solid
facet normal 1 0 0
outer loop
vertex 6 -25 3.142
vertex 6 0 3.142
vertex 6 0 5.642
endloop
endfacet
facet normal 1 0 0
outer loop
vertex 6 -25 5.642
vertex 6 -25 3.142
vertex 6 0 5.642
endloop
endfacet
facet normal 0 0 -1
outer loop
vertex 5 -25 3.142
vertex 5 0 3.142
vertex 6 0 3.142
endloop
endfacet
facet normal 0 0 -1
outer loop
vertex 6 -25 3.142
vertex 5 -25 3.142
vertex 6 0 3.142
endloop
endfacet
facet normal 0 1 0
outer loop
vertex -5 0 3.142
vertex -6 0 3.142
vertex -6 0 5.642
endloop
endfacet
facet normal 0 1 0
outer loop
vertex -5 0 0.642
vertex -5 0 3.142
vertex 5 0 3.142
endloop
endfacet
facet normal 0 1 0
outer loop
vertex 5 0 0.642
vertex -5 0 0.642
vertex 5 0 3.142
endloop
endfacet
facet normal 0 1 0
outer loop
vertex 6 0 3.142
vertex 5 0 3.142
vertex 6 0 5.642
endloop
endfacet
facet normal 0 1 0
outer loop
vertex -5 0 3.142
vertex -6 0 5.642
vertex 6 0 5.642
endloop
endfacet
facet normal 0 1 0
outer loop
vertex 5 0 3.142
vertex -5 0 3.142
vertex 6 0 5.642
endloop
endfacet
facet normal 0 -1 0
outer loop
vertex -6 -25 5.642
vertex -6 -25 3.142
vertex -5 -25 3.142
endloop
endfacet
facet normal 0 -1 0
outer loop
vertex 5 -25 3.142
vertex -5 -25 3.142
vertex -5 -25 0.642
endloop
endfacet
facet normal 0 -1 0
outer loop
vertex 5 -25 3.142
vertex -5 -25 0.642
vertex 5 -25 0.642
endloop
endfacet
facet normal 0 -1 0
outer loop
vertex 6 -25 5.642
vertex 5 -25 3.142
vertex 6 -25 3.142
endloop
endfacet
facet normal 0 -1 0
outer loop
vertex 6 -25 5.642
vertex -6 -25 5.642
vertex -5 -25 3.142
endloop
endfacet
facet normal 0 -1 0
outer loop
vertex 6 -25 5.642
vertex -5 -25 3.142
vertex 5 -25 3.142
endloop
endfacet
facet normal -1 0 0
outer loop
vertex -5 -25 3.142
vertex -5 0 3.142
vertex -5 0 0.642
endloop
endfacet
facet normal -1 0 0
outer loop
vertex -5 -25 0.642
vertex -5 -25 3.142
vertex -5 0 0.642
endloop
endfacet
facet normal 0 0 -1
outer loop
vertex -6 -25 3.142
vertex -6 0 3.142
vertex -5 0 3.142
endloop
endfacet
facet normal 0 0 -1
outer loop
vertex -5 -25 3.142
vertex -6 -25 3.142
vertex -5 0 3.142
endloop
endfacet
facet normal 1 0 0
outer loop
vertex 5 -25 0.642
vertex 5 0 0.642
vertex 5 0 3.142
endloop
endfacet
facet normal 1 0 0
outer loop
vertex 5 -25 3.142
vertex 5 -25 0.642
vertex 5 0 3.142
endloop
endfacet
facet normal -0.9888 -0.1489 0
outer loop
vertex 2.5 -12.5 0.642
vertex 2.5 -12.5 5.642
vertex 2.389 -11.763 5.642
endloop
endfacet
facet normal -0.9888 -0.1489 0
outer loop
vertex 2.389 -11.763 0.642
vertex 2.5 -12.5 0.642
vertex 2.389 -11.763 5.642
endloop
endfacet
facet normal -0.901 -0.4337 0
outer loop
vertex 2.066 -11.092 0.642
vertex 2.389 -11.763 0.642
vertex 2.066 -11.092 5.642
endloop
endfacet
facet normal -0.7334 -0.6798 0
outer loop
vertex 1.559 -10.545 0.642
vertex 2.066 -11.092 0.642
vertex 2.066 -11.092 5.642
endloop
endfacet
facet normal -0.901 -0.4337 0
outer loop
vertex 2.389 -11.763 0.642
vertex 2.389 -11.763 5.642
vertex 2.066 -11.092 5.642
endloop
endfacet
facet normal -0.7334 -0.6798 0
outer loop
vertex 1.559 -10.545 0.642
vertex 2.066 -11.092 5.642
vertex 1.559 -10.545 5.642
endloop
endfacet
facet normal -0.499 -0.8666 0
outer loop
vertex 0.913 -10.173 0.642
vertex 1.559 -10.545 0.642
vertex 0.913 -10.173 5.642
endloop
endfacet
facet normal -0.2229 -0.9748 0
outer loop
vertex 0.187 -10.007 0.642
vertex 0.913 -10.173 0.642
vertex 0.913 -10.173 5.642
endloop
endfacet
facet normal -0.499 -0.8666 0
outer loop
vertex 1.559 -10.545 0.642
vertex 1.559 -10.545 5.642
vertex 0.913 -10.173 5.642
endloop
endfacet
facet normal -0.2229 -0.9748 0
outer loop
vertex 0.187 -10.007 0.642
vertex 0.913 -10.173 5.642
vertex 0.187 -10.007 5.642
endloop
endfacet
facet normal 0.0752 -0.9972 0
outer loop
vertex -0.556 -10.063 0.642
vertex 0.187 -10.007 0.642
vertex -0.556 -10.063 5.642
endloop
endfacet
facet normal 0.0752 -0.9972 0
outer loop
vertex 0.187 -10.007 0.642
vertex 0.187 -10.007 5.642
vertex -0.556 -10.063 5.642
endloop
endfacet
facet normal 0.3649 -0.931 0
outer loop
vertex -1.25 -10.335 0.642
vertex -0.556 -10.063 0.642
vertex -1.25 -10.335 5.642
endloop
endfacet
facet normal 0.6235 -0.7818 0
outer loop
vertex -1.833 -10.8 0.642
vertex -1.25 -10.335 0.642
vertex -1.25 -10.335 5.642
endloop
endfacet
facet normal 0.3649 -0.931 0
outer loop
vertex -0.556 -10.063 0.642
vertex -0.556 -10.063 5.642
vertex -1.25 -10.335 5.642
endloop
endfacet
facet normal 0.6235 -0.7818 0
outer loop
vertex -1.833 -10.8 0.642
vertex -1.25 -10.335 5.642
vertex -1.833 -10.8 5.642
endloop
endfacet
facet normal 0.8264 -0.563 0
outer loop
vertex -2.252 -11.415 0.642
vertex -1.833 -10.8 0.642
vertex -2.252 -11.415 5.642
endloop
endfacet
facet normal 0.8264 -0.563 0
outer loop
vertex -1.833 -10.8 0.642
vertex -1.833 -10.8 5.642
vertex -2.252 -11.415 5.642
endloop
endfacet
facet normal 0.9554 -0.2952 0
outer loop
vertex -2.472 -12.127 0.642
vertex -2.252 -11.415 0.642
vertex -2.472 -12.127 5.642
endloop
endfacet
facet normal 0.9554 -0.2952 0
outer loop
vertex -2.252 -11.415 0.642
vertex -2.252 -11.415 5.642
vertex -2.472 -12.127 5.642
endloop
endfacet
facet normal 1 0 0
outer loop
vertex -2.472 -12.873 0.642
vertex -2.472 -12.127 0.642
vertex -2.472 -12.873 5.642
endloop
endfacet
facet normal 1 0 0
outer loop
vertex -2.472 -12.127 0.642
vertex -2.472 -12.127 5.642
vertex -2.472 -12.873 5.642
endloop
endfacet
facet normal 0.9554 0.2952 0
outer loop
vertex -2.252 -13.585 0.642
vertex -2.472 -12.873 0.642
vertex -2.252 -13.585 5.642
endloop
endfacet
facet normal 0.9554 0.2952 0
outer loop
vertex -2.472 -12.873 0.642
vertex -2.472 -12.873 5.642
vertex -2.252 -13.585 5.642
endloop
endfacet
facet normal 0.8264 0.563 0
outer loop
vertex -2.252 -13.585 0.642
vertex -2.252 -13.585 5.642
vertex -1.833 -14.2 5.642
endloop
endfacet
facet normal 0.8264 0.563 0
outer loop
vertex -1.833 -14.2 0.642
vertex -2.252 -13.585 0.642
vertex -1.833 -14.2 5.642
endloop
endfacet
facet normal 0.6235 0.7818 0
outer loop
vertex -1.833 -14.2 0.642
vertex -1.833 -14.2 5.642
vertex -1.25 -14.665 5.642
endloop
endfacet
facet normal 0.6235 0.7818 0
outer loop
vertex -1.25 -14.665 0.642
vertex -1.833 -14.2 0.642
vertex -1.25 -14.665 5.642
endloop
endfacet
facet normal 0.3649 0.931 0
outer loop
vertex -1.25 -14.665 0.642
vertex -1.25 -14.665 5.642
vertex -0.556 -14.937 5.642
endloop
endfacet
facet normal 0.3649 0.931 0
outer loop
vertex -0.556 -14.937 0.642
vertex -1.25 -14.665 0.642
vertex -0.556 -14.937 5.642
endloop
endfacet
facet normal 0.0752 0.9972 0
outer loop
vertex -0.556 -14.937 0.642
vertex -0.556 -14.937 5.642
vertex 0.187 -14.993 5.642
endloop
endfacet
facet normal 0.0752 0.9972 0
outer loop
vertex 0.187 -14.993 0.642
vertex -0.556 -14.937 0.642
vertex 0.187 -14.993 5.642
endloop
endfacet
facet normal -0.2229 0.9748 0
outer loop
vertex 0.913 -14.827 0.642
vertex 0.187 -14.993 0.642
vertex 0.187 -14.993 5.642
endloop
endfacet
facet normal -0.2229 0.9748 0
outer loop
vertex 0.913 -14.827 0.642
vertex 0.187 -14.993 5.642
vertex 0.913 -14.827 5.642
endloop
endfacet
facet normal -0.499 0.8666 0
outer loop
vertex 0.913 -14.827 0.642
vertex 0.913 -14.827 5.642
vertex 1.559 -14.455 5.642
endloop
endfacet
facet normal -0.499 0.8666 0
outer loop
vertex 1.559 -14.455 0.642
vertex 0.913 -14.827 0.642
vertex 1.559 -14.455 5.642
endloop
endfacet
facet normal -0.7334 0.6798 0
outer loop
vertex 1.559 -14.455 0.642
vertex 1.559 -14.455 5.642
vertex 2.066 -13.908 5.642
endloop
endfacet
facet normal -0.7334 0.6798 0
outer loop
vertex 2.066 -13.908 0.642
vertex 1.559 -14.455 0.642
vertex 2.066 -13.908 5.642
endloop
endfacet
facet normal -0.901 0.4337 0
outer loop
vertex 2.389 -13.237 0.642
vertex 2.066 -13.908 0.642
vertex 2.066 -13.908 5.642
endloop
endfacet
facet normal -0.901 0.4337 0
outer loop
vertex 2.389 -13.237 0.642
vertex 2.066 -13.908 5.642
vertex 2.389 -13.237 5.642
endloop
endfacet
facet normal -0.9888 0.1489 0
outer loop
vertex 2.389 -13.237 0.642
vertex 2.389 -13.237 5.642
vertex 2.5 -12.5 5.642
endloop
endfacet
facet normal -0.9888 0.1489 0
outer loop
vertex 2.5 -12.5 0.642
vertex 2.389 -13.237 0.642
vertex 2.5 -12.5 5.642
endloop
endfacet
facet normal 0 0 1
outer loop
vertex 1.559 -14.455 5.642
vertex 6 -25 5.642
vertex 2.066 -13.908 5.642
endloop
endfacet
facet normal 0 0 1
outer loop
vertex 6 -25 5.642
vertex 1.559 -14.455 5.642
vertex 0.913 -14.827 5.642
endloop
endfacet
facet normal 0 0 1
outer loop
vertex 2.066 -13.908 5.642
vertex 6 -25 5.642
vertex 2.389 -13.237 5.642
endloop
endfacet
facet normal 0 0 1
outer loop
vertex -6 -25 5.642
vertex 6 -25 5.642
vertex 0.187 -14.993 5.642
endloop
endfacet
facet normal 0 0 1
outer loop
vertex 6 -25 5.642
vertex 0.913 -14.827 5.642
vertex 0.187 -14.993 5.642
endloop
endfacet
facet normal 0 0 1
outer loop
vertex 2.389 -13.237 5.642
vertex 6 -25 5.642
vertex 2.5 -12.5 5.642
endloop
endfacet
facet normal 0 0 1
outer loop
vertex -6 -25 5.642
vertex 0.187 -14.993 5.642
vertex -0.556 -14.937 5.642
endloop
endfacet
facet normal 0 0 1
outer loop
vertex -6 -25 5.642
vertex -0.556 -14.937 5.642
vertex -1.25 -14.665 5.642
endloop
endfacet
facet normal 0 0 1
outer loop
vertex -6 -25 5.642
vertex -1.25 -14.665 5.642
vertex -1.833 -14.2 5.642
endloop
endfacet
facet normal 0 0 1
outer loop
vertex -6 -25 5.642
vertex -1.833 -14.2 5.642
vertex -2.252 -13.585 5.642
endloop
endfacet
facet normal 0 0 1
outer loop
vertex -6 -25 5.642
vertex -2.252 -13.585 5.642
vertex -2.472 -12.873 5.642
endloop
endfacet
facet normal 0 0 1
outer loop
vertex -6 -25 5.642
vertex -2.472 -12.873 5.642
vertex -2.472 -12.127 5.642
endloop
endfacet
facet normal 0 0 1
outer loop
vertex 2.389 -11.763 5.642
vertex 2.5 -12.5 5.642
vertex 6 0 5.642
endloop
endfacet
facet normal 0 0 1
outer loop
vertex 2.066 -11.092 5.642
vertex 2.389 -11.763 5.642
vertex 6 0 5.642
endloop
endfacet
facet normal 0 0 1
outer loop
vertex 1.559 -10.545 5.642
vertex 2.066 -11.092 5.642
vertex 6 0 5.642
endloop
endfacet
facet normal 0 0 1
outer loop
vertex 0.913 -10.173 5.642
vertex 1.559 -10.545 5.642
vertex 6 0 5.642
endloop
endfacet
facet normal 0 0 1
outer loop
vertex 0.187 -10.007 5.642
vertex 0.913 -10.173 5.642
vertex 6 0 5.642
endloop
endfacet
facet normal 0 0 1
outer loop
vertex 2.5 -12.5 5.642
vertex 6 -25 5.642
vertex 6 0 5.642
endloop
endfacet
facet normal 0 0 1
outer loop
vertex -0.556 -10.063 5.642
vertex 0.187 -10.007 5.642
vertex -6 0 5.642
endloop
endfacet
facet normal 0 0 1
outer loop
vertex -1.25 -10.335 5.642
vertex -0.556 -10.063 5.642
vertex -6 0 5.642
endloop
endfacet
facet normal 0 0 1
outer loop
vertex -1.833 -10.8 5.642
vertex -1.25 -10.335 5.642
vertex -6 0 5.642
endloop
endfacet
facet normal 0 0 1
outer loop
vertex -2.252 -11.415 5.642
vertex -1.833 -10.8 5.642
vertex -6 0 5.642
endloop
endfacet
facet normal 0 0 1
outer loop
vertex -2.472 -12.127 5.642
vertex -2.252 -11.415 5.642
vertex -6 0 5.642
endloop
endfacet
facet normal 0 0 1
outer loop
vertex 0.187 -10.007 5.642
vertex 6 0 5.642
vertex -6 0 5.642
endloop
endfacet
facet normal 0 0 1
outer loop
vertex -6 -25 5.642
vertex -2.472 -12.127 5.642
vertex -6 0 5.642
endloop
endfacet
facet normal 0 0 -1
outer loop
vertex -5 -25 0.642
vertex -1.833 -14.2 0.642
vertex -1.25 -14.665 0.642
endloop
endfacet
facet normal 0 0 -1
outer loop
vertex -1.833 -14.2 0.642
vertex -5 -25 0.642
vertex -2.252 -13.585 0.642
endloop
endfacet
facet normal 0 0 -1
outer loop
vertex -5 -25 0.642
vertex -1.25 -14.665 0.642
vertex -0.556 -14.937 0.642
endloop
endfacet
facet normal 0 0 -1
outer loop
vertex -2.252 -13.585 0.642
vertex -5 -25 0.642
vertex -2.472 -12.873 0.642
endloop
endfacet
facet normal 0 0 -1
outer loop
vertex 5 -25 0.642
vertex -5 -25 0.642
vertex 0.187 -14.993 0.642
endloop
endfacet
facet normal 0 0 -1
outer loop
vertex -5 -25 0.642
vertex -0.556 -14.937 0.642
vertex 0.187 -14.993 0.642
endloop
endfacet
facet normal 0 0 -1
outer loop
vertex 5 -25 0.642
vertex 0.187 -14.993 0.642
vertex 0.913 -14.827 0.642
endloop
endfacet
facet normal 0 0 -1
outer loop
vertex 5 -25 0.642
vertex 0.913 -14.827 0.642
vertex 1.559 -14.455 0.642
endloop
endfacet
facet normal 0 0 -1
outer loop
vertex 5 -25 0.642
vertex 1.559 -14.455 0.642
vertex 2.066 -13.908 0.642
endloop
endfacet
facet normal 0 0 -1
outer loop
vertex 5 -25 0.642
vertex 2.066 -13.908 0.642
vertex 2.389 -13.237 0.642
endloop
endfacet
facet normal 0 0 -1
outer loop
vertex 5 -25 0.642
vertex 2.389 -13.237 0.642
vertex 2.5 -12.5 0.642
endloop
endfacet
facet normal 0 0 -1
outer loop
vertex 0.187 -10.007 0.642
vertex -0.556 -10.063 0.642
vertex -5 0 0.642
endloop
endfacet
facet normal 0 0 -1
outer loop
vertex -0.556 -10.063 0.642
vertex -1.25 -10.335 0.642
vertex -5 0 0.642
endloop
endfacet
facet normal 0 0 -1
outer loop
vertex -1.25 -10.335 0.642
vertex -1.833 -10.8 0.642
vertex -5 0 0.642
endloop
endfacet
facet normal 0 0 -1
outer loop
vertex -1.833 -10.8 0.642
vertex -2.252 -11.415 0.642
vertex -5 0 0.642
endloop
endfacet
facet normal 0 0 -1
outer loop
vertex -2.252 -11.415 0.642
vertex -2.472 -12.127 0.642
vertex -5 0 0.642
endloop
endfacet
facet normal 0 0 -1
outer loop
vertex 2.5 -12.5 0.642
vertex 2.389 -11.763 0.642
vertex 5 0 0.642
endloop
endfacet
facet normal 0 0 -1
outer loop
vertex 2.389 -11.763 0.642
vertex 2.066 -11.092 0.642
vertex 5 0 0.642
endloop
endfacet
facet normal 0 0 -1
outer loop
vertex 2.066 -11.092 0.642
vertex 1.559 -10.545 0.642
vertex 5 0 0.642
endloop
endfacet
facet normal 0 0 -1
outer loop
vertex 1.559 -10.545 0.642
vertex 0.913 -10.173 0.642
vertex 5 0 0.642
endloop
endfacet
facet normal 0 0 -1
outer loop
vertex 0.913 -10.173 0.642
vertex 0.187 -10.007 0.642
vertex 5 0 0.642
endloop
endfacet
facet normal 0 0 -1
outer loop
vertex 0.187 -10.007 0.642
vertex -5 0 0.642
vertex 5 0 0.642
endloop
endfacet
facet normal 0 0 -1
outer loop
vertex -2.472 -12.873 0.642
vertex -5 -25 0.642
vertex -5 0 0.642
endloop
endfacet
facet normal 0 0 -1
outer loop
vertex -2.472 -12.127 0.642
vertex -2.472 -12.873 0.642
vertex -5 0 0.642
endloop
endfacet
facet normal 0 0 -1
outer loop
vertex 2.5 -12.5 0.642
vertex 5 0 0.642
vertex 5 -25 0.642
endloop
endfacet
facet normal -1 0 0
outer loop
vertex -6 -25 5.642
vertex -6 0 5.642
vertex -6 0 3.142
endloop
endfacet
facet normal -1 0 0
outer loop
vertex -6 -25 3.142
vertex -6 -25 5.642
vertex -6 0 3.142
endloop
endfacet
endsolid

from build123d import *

# Parameters (mm, degrees)
F1_DEPTH = 25
F2_R     = 2.5
F3_DEPTH = 25


with BuildPart() as f1:
    # F0 (on Front) → F1 (new body)
    with BuildSketch(Plane.XZ):
        Polygon((6, 5.64185), (0, 5.64185), (0, 0.64185), (5, 0.64185), (5, 3.14185), (6, 3.14185), align=None)
        Polygon((0, 0.64185), (0, 5.64185), (-6, 5.64185), (-6, 3.14185), (-5, 3.14185), (-5, 0.64185), align=None)
    extrude(amount=F1_DEPTH)

    # F2 (on face) → F3 (cut)
    with BuildSketch(Plane.XY.offset(5.64185)):
        with Locations((0, -12.5)):
            Circle(F2_R)
    extrude(amount=-F3_DEPTH, mode=Mode.SUBTRACT)


solid = f1.part
